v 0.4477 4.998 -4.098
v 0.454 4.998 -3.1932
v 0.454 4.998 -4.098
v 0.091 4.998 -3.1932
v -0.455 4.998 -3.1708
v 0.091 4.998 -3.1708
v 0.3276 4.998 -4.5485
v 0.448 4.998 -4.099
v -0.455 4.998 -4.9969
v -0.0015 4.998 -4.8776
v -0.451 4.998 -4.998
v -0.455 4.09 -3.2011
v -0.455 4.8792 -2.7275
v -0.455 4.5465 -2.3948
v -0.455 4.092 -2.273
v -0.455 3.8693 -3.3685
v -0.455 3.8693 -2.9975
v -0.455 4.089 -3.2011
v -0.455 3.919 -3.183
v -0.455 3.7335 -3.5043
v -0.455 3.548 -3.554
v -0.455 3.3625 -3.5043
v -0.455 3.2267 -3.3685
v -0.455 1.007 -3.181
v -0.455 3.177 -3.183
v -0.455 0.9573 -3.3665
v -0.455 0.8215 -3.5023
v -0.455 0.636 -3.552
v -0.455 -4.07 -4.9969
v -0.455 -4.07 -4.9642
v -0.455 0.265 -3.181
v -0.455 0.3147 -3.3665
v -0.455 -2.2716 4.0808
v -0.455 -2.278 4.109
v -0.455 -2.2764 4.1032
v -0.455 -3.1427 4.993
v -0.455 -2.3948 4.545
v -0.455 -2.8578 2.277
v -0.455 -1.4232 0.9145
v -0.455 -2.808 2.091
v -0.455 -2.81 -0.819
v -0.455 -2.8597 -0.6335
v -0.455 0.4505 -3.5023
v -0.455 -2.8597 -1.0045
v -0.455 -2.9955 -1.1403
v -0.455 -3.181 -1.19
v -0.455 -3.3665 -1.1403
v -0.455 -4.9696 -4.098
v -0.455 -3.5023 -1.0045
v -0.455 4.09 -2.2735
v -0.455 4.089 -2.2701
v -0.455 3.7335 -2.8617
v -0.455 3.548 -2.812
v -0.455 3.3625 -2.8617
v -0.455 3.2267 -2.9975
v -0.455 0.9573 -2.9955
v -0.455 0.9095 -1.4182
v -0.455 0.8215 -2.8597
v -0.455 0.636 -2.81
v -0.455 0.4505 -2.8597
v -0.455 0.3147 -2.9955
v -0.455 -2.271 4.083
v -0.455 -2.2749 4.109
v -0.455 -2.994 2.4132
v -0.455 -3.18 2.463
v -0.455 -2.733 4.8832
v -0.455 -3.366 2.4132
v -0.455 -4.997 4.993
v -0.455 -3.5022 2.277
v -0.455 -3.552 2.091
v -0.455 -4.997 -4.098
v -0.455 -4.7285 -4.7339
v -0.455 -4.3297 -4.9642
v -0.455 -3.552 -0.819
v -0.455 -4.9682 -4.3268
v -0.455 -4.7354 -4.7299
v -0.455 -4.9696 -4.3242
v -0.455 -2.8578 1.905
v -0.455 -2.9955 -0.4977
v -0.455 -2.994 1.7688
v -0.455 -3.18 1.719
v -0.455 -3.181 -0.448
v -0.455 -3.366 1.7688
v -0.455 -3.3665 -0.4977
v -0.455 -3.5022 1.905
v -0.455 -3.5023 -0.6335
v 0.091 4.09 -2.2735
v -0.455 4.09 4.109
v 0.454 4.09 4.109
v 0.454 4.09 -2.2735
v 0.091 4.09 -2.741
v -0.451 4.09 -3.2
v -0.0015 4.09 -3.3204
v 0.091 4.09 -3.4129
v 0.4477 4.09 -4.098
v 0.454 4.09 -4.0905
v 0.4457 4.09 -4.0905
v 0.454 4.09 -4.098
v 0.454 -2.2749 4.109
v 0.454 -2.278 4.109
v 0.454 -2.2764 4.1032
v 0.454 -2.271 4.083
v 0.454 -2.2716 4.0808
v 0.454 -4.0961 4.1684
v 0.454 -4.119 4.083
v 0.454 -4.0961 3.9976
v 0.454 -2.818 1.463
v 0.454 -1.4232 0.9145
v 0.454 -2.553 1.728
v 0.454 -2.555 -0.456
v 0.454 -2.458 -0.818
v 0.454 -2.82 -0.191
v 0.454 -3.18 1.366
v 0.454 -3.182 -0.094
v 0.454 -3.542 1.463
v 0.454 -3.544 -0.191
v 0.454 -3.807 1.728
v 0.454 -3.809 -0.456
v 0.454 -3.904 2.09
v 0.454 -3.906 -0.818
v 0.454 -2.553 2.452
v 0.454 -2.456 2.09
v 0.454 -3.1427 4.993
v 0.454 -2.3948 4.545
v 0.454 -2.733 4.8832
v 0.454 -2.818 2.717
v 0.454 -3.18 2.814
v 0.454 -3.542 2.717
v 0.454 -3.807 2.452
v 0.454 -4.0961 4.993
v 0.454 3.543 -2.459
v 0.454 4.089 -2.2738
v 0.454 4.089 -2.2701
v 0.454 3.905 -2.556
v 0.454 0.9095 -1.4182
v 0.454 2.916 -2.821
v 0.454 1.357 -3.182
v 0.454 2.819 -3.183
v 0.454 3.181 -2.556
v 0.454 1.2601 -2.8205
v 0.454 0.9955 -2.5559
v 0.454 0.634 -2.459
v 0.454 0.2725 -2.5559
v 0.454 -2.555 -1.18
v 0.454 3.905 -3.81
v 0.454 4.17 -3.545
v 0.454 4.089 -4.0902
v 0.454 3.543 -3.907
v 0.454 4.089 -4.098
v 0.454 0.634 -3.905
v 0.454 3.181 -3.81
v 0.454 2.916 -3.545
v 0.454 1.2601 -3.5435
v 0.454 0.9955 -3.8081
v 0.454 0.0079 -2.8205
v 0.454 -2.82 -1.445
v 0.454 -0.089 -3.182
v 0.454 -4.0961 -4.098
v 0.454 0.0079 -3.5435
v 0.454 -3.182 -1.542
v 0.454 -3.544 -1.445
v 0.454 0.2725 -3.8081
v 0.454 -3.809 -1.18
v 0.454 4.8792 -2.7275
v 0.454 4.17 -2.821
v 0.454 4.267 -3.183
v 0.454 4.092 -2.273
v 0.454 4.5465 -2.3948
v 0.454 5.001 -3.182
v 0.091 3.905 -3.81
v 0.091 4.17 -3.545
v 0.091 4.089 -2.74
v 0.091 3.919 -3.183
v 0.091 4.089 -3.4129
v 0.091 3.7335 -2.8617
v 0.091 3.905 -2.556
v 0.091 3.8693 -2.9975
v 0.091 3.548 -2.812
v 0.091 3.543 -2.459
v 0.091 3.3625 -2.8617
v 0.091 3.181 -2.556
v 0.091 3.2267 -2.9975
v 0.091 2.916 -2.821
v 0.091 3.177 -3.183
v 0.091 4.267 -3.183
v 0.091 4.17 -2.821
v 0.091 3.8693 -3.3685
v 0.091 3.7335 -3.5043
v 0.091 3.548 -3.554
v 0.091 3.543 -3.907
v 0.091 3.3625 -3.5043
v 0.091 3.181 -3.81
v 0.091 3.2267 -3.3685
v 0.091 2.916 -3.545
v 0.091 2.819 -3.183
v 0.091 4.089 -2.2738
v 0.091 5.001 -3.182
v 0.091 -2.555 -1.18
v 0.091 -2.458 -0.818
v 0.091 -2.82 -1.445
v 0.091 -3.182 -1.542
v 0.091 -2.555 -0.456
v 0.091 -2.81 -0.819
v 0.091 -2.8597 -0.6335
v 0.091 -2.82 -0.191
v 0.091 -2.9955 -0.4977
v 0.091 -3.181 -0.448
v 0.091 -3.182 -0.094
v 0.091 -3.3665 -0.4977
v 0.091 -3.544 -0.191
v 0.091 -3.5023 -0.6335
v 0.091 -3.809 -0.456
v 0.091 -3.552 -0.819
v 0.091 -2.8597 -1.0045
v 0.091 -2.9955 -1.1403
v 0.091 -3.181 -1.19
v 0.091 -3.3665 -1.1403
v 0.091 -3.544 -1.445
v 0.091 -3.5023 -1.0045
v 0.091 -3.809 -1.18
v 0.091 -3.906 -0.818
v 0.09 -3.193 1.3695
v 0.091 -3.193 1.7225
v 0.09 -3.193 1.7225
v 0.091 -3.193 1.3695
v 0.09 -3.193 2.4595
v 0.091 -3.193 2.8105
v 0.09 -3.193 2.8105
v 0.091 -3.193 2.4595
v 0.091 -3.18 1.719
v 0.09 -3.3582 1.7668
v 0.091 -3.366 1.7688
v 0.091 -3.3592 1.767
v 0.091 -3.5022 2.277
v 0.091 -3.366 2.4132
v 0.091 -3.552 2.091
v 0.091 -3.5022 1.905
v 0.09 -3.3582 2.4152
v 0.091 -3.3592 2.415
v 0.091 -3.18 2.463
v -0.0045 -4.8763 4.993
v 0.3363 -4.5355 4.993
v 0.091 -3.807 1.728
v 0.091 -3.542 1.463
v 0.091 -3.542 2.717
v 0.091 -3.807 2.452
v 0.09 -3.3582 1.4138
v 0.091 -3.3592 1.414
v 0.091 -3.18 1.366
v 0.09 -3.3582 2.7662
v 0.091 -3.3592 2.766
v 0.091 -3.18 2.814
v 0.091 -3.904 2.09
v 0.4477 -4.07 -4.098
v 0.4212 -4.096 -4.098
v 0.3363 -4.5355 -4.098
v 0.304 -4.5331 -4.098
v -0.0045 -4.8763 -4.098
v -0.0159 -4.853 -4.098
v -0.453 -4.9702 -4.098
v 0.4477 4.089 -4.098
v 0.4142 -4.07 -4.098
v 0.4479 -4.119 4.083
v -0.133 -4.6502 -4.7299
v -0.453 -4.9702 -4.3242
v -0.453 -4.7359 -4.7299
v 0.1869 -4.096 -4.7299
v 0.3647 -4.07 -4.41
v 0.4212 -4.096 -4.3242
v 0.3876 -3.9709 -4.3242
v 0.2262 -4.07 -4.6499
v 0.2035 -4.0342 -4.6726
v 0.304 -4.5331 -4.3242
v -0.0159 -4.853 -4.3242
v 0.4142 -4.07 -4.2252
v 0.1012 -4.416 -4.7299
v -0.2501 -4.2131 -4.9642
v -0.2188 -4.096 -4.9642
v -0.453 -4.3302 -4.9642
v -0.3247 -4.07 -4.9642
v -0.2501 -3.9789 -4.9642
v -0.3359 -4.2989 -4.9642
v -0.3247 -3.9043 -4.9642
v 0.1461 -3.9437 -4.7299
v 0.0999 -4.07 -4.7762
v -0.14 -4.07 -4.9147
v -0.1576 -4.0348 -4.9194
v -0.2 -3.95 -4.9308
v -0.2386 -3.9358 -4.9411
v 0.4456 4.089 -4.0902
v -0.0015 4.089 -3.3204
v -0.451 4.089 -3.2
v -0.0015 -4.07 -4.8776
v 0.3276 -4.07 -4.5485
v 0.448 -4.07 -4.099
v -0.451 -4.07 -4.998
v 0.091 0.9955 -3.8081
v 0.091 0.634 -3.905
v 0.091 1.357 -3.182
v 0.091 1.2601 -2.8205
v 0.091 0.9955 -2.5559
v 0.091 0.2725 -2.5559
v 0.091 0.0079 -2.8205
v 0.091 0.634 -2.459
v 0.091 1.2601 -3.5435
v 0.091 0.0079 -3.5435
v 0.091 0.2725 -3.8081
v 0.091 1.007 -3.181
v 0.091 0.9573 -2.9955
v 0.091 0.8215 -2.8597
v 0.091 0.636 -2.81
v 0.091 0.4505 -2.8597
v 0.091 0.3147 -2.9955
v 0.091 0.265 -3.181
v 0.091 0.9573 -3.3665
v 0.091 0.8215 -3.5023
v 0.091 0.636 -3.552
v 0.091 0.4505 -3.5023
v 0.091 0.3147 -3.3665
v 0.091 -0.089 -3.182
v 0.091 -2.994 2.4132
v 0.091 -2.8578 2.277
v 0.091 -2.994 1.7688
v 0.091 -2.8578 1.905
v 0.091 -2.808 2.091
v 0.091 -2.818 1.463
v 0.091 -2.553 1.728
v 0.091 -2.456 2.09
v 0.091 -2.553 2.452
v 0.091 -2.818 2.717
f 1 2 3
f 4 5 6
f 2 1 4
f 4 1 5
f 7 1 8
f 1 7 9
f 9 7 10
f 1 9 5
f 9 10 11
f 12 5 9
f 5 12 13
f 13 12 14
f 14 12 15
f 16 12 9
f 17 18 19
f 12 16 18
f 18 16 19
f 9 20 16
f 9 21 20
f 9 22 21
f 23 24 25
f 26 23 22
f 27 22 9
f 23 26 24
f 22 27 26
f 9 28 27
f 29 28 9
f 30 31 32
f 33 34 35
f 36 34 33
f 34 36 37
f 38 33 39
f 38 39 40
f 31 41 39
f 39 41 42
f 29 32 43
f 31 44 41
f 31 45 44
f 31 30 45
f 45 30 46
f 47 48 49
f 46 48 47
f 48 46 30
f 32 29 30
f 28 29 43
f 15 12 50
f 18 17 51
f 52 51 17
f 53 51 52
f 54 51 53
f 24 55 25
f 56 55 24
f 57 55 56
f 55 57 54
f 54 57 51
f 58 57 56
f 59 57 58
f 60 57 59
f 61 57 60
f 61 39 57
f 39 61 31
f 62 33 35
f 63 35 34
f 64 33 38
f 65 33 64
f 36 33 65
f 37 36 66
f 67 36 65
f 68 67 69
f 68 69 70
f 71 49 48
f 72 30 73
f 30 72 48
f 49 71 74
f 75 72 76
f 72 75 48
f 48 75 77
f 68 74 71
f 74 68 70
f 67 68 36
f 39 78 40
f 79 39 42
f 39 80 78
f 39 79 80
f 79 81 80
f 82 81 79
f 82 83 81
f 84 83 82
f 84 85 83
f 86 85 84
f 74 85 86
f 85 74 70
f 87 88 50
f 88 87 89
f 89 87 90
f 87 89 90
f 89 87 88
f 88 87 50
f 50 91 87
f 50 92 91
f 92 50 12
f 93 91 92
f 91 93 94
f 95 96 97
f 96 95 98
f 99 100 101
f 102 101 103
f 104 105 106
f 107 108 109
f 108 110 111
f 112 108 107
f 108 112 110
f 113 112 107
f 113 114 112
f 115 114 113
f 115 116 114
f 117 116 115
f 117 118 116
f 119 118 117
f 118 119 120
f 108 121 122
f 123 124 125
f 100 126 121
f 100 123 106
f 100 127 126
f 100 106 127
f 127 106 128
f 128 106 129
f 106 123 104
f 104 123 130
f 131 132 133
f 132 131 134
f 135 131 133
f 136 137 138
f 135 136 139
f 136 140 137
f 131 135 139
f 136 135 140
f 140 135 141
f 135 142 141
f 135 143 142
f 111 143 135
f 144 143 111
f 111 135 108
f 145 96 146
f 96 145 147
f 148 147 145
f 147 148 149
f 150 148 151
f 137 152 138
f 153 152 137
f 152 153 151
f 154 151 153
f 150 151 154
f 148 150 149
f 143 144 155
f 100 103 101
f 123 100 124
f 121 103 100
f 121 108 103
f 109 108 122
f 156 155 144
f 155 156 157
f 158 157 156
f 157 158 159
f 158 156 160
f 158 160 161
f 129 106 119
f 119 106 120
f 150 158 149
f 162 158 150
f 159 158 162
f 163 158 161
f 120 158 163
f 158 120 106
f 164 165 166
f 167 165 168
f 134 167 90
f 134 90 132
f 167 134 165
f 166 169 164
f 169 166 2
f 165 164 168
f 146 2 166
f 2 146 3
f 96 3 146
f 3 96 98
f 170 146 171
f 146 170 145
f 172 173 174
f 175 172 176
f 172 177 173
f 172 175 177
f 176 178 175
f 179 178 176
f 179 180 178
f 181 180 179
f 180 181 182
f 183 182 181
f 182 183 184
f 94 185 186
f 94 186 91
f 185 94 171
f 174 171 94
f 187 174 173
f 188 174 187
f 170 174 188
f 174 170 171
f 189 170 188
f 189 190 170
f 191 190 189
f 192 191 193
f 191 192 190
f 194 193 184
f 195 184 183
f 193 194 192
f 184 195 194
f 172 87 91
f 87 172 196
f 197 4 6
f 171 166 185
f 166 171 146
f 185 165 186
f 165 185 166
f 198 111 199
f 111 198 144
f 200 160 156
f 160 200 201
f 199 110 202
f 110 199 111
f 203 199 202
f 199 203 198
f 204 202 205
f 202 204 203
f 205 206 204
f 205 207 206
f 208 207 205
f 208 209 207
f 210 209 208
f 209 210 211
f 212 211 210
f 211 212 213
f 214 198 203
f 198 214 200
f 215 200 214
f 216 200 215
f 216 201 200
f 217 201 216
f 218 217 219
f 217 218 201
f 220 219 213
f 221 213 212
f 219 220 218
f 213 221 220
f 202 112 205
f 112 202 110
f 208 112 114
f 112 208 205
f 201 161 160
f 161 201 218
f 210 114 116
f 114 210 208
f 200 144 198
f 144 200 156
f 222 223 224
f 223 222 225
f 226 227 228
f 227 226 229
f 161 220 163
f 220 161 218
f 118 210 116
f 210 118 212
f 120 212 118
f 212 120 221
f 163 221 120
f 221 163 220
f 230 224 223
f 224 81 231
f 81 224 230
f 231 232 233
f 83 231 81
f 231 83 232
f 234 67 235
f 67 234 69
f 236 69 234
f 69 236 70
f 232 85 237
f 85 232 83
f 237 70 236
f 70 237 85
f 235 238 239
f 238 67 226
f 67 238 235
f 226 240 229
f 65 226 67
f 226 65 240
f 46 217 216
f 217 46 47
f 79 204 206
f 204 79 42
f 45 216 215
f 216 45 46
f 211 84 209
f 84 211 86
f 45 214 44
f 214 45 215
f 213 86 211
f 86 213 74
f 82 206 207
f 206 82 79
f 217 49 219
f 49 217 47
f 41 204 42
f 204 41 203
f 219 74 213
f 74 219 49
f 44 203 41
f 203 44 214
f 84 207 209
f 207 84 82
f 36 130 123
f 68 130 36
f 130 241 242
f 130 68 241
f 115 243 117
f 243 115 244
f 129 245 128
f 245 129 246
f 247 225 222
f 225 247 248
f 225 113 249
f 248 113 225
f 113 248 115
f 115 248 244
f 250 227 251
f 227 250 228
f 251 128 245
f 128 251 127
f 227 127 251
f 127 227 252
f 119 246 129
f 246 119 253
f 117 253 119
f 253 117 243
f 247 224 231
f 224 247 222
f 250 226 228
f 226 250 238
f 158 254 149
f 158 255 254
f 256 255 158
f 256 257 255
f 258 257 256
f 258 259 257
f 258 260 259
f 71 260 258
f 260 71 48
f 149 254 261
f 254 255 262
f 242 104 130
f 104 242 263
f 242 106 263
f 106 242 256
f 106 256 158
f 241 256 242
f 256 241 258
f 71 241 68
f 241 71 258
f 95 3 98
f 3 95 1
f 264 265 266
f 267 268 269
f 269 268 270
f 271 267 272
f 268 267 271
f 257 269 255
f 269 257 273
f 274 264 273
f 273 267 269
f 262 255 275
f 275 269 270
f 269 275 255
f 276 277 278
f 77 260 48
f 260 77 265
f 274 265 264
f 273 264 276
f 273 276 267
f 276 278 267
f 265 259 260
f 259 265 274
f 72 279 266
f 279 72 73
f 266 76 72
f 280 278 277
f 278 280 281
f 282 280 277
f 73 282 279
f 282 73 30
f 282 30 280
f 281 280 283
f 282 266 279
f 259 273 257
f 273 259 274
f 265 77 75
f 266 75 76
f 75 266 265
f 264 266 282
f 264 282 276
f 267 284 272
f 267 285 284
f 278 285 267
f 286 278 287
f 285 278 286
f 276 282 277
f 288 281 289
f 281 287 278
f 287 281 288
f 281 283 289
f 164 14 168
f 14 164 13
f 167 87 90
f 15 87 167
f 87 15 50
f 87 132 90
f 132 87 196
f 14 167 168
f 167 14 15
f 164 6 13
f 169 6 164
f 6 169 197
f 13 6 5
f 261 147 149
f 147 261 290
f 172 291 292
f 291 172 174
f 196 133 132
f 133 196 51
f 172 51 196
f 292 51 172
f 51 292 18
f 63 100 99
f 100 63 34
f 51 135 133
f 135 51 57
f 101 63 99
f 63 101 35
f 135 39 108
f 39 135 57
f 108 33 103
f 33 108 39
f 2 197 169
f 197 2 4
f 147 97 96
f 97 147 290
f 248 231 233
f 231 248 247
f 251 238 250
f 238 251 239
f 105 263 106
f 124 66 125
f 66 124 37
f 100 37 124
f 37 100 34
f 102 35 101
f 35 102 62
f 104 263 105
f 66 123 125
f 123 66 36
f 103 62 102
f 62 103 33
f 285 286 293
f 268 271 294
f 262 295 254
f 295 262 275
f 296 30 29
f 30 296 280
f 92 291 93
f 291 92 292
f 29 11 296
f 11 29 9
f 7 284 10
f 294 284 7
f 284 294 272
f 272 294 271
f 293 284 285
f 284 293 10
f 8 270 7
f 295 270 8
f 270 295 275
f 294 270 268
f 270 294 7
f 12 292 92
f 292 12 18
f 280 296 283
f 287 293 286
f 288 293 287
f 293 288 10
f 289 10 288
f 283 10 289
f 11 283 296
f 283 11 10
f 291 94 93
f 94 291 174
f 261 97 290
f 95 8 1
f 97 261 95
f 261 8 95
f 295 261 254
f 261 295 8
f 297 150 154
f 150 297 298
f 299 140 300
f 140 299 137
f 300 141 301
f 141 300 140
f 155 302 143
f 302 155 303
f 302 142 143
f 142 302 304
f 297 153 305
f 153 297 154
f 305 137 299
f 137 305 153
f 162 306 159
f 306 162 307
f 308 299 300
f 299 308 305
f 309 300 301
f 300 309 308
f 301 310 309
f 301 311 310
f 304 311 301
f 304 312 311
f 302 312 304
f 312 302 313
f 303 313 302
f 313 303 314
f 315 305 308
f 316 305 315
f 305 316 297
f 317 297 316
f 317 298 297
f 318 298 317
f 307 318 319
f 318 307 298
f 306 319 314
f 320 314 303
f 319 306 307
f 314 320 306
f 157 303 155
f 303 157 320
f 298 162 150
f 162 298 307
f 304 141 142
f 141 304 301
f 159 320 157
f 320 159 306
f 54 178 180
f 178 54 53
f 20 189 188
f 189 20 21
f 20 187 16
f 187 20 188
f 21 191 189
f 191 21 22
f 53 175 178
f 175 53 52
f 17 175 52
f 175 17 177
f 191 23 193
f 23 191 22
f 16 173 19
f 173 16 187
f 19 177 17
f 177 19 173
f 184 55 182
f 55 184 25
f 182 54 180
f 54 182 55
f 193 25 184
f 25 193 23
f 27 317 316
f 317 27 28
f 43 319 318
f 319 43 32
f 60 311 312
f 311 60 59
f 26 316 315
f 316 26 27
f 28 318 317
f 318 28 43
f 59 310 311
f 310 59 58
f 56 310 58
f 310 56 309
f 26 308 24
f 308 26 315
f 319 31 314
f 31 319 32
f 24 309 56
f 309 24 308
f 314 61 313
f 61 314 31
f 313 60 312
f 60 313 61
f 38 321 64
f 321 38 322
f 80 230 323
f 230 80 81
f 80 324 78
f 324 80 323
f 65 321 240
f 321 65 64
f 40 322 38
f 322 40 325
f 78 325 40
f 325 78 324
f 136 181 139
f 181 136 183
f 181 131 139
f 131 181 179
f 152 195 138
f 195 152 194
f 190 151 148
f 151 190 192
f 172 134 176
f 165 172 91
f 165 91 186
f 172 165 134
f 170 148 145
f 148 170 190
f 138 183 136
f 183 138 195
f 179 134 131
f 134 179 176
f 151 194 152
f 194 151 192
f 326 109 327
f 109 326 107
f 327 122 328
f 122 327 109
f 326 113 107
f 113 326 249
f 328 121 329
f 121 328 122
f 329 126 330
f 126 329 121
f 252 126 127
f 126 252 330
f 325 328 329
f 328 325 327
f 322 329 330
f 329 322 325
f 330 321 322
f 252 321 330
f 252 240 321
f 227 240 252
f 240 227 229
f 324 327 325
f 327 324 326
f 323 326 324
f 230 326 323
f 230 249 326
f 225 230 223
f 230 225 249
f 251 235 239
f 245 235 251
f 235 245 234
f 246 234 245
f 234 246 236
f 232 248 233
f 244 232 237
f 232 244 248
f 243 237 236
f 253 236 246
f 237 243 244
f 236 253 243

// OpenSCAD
intersection() {
translate([-0.545, -6, -6]) cube(size = [1.091, 12, 12], center = false);
union() {
intersection() {
difference() {
union() {
rotate([180, 90, 180])
translate([0.818, -3.182, -18.1])
cylinder(h = 18.191, r1 = 0.724, r2 = 0.724, center = false, $fn = 12);
rotate([-90, 0, 0])
translate([-0.455, -18.1, -18.1]) cube(size = [0.909, 36.2, 14.907], center = false);
difference() {
rotate([-90, 0, 0])
translate([-0.455, -4.109, 4.09]) cube(size = [0.909, 22.209, 0.908], center = false);
rotate([180, 90, 180])
translate([3.183, 3.543, 0.091])
cylinder(h = 18.009, r1 = 0.724, r2 = 0.724, center = false, $fn = 12);
}
}
union() {
rotate([180, 90, 180])
translate([0.818, -3.182, 0.091])
cylinder(h = 18.009, r1 = 0.724, r2 = 0.724, center = false, $fn = 12);
rotate([180, 90, 180])
translate([-2.091, -3.18, -18.1])
cylinder(h = 18.191, r1 = 0.372, r2 = 0.372, center = false, $fn = 12);
rotate([-90, 0, 0])
translate([0.091, -4.109, -18.1]) cube(size = [18.009, 7.285, 14.03], center = false);
rotate([180, 90, 180])
translate([0.819, -3.181, -0.455])
cylinder(h = 18.555, r1 = 0.371, r2 = 0.371, center = false, $fn = 12);
}
}
union() {
difference() {
rotate([-90, 0, 0])
translate([-0.455, -4.993, -4.07]) cube(size = [18.555, 8.169, 8.16], center = false);
rotate([180, 90, 180])
translate([-2.09, -3.18, -18.1])
cylinder(h = 18.555, r1 = 0.724, r2 = 0.724, center = false, $fn = 12);
}
rotate([180, 90, 180])
translate([-2.09, -3.18, -0.455])
cylinder(h = 0.545, r1 = 0.724, r2 = 0.724, center = false, $fn = 12);
translate([-0.47, -4.07, -4.098])
cylinder(h = 0.922, r1 = 0.931, r2 = 0.931, center = false, $fn = 12);
rotate([-90, 0, 0])
translate([-0.455, 3.176, 4.09]) cube(size = [0.909, 0.922, 0.908], center = false);
translate([-0.453, -4.096, -4.09]) sphere(r = 0.905, $fn = 12);
rotate([180, 90, 180])
translate([3.182, 4.092, -18.1])
cylinder(h = 18.191, r1 = 0.909, r2 = 0.909, center = false, $fn = 12);
}
}
intersection() {
union() {
rotate([180, 90, 180])
translate([3.182, 4.092, 0.091])
cylinder(h = 18.009, r1 = 0.909, r2 = 0.909, center = false, $fn = 12);
translate([-0.47, -4.07, -4.098])
cylinder(h = 22.198, r1 = 0.931, r2 = 0.931, center = false, $fn = 12);
rotate([180, 90, 180])
translate([-4.083, -3.195, -18.1])
cylinder(h = 36.2, r1 = 0.924, r2 = 0.924, center = false, $fn = 12);
difference() {
rotate([-90, 0, 0])
translate([-18.1, -4.109, -3.193]) cube(size = [36.2, 8.207, 7.282], center = false);
rotate([180, 90, 180])
translate([-4.101, 4.096, -18.1])
cylinder(h = 18.555, r1 = 6.373, r2 = 6.373, center = false, $fn = 12);
}
rotate([-90, 0, 0])
translate([-18.1, 3.176, -4.07]) cube(size = [36.2, 0.922, 0.878], center = false);
rotate([180, 90, -90])
translate([4.099, 0.451, -4.07])
cylinder(h = 9.068, r1 = 0.899, r2 = 0.899, center = false, $fn = 12);
}
difference() {
difference() {
difference() {
rotate([-90, 0, 0])
translate([-0.455, -4.993, -18.1]) cube(size = [0.909, 23.093, 36.2], center = false);
rotate([180, 90, 180])
translate([3.182, 0.634, 0.091])
cylinder(h = 0.364, r1 = 0.723, r2 = 0.723, center = false, $fn = 12);
}
union() {
rotate([180, 90, 180])
translate([3.183, 3.548, -18.1])
cylinder(h = 36.2, r1 = 0.371, r2 = 0.371, center = false, $fn = 12);
rotate([180, 90, 180])
translate([3.181, 0.636, -18.1])
cylinder(h = 18.555, r1 = 0.371, r2 = 0.371, center = false, $fn = 12);
}
}
union() {
rotate([180, 90, 180])
translate([-2.091, -3.18, -0.455])
cylinder(h = 18.555, r1 = 0.372, r2 = 0.372, center = false, $fn = 12);
rotate([180, 90, 180])
translate([0.818, -3.182, -18.1])
cylinder(h = 36.2, r1 = 0.724, r2 = 0.724, center = false, $fn = 12);
rotate([180, 90, 180])
translate([3.183, 3.543, 0.091])
cylinder(h = 18.009, r1 = 0.724, r2 = 0.724, center = false, $fn = 12);
rotate([180, 90, 180])
translate([-2.09, -3.18, 0.091])
cylinder(h = 0.364, r1 = 0.724, r2 = 0.724, center = false, $fn = 12);
}
}
}
}
}
